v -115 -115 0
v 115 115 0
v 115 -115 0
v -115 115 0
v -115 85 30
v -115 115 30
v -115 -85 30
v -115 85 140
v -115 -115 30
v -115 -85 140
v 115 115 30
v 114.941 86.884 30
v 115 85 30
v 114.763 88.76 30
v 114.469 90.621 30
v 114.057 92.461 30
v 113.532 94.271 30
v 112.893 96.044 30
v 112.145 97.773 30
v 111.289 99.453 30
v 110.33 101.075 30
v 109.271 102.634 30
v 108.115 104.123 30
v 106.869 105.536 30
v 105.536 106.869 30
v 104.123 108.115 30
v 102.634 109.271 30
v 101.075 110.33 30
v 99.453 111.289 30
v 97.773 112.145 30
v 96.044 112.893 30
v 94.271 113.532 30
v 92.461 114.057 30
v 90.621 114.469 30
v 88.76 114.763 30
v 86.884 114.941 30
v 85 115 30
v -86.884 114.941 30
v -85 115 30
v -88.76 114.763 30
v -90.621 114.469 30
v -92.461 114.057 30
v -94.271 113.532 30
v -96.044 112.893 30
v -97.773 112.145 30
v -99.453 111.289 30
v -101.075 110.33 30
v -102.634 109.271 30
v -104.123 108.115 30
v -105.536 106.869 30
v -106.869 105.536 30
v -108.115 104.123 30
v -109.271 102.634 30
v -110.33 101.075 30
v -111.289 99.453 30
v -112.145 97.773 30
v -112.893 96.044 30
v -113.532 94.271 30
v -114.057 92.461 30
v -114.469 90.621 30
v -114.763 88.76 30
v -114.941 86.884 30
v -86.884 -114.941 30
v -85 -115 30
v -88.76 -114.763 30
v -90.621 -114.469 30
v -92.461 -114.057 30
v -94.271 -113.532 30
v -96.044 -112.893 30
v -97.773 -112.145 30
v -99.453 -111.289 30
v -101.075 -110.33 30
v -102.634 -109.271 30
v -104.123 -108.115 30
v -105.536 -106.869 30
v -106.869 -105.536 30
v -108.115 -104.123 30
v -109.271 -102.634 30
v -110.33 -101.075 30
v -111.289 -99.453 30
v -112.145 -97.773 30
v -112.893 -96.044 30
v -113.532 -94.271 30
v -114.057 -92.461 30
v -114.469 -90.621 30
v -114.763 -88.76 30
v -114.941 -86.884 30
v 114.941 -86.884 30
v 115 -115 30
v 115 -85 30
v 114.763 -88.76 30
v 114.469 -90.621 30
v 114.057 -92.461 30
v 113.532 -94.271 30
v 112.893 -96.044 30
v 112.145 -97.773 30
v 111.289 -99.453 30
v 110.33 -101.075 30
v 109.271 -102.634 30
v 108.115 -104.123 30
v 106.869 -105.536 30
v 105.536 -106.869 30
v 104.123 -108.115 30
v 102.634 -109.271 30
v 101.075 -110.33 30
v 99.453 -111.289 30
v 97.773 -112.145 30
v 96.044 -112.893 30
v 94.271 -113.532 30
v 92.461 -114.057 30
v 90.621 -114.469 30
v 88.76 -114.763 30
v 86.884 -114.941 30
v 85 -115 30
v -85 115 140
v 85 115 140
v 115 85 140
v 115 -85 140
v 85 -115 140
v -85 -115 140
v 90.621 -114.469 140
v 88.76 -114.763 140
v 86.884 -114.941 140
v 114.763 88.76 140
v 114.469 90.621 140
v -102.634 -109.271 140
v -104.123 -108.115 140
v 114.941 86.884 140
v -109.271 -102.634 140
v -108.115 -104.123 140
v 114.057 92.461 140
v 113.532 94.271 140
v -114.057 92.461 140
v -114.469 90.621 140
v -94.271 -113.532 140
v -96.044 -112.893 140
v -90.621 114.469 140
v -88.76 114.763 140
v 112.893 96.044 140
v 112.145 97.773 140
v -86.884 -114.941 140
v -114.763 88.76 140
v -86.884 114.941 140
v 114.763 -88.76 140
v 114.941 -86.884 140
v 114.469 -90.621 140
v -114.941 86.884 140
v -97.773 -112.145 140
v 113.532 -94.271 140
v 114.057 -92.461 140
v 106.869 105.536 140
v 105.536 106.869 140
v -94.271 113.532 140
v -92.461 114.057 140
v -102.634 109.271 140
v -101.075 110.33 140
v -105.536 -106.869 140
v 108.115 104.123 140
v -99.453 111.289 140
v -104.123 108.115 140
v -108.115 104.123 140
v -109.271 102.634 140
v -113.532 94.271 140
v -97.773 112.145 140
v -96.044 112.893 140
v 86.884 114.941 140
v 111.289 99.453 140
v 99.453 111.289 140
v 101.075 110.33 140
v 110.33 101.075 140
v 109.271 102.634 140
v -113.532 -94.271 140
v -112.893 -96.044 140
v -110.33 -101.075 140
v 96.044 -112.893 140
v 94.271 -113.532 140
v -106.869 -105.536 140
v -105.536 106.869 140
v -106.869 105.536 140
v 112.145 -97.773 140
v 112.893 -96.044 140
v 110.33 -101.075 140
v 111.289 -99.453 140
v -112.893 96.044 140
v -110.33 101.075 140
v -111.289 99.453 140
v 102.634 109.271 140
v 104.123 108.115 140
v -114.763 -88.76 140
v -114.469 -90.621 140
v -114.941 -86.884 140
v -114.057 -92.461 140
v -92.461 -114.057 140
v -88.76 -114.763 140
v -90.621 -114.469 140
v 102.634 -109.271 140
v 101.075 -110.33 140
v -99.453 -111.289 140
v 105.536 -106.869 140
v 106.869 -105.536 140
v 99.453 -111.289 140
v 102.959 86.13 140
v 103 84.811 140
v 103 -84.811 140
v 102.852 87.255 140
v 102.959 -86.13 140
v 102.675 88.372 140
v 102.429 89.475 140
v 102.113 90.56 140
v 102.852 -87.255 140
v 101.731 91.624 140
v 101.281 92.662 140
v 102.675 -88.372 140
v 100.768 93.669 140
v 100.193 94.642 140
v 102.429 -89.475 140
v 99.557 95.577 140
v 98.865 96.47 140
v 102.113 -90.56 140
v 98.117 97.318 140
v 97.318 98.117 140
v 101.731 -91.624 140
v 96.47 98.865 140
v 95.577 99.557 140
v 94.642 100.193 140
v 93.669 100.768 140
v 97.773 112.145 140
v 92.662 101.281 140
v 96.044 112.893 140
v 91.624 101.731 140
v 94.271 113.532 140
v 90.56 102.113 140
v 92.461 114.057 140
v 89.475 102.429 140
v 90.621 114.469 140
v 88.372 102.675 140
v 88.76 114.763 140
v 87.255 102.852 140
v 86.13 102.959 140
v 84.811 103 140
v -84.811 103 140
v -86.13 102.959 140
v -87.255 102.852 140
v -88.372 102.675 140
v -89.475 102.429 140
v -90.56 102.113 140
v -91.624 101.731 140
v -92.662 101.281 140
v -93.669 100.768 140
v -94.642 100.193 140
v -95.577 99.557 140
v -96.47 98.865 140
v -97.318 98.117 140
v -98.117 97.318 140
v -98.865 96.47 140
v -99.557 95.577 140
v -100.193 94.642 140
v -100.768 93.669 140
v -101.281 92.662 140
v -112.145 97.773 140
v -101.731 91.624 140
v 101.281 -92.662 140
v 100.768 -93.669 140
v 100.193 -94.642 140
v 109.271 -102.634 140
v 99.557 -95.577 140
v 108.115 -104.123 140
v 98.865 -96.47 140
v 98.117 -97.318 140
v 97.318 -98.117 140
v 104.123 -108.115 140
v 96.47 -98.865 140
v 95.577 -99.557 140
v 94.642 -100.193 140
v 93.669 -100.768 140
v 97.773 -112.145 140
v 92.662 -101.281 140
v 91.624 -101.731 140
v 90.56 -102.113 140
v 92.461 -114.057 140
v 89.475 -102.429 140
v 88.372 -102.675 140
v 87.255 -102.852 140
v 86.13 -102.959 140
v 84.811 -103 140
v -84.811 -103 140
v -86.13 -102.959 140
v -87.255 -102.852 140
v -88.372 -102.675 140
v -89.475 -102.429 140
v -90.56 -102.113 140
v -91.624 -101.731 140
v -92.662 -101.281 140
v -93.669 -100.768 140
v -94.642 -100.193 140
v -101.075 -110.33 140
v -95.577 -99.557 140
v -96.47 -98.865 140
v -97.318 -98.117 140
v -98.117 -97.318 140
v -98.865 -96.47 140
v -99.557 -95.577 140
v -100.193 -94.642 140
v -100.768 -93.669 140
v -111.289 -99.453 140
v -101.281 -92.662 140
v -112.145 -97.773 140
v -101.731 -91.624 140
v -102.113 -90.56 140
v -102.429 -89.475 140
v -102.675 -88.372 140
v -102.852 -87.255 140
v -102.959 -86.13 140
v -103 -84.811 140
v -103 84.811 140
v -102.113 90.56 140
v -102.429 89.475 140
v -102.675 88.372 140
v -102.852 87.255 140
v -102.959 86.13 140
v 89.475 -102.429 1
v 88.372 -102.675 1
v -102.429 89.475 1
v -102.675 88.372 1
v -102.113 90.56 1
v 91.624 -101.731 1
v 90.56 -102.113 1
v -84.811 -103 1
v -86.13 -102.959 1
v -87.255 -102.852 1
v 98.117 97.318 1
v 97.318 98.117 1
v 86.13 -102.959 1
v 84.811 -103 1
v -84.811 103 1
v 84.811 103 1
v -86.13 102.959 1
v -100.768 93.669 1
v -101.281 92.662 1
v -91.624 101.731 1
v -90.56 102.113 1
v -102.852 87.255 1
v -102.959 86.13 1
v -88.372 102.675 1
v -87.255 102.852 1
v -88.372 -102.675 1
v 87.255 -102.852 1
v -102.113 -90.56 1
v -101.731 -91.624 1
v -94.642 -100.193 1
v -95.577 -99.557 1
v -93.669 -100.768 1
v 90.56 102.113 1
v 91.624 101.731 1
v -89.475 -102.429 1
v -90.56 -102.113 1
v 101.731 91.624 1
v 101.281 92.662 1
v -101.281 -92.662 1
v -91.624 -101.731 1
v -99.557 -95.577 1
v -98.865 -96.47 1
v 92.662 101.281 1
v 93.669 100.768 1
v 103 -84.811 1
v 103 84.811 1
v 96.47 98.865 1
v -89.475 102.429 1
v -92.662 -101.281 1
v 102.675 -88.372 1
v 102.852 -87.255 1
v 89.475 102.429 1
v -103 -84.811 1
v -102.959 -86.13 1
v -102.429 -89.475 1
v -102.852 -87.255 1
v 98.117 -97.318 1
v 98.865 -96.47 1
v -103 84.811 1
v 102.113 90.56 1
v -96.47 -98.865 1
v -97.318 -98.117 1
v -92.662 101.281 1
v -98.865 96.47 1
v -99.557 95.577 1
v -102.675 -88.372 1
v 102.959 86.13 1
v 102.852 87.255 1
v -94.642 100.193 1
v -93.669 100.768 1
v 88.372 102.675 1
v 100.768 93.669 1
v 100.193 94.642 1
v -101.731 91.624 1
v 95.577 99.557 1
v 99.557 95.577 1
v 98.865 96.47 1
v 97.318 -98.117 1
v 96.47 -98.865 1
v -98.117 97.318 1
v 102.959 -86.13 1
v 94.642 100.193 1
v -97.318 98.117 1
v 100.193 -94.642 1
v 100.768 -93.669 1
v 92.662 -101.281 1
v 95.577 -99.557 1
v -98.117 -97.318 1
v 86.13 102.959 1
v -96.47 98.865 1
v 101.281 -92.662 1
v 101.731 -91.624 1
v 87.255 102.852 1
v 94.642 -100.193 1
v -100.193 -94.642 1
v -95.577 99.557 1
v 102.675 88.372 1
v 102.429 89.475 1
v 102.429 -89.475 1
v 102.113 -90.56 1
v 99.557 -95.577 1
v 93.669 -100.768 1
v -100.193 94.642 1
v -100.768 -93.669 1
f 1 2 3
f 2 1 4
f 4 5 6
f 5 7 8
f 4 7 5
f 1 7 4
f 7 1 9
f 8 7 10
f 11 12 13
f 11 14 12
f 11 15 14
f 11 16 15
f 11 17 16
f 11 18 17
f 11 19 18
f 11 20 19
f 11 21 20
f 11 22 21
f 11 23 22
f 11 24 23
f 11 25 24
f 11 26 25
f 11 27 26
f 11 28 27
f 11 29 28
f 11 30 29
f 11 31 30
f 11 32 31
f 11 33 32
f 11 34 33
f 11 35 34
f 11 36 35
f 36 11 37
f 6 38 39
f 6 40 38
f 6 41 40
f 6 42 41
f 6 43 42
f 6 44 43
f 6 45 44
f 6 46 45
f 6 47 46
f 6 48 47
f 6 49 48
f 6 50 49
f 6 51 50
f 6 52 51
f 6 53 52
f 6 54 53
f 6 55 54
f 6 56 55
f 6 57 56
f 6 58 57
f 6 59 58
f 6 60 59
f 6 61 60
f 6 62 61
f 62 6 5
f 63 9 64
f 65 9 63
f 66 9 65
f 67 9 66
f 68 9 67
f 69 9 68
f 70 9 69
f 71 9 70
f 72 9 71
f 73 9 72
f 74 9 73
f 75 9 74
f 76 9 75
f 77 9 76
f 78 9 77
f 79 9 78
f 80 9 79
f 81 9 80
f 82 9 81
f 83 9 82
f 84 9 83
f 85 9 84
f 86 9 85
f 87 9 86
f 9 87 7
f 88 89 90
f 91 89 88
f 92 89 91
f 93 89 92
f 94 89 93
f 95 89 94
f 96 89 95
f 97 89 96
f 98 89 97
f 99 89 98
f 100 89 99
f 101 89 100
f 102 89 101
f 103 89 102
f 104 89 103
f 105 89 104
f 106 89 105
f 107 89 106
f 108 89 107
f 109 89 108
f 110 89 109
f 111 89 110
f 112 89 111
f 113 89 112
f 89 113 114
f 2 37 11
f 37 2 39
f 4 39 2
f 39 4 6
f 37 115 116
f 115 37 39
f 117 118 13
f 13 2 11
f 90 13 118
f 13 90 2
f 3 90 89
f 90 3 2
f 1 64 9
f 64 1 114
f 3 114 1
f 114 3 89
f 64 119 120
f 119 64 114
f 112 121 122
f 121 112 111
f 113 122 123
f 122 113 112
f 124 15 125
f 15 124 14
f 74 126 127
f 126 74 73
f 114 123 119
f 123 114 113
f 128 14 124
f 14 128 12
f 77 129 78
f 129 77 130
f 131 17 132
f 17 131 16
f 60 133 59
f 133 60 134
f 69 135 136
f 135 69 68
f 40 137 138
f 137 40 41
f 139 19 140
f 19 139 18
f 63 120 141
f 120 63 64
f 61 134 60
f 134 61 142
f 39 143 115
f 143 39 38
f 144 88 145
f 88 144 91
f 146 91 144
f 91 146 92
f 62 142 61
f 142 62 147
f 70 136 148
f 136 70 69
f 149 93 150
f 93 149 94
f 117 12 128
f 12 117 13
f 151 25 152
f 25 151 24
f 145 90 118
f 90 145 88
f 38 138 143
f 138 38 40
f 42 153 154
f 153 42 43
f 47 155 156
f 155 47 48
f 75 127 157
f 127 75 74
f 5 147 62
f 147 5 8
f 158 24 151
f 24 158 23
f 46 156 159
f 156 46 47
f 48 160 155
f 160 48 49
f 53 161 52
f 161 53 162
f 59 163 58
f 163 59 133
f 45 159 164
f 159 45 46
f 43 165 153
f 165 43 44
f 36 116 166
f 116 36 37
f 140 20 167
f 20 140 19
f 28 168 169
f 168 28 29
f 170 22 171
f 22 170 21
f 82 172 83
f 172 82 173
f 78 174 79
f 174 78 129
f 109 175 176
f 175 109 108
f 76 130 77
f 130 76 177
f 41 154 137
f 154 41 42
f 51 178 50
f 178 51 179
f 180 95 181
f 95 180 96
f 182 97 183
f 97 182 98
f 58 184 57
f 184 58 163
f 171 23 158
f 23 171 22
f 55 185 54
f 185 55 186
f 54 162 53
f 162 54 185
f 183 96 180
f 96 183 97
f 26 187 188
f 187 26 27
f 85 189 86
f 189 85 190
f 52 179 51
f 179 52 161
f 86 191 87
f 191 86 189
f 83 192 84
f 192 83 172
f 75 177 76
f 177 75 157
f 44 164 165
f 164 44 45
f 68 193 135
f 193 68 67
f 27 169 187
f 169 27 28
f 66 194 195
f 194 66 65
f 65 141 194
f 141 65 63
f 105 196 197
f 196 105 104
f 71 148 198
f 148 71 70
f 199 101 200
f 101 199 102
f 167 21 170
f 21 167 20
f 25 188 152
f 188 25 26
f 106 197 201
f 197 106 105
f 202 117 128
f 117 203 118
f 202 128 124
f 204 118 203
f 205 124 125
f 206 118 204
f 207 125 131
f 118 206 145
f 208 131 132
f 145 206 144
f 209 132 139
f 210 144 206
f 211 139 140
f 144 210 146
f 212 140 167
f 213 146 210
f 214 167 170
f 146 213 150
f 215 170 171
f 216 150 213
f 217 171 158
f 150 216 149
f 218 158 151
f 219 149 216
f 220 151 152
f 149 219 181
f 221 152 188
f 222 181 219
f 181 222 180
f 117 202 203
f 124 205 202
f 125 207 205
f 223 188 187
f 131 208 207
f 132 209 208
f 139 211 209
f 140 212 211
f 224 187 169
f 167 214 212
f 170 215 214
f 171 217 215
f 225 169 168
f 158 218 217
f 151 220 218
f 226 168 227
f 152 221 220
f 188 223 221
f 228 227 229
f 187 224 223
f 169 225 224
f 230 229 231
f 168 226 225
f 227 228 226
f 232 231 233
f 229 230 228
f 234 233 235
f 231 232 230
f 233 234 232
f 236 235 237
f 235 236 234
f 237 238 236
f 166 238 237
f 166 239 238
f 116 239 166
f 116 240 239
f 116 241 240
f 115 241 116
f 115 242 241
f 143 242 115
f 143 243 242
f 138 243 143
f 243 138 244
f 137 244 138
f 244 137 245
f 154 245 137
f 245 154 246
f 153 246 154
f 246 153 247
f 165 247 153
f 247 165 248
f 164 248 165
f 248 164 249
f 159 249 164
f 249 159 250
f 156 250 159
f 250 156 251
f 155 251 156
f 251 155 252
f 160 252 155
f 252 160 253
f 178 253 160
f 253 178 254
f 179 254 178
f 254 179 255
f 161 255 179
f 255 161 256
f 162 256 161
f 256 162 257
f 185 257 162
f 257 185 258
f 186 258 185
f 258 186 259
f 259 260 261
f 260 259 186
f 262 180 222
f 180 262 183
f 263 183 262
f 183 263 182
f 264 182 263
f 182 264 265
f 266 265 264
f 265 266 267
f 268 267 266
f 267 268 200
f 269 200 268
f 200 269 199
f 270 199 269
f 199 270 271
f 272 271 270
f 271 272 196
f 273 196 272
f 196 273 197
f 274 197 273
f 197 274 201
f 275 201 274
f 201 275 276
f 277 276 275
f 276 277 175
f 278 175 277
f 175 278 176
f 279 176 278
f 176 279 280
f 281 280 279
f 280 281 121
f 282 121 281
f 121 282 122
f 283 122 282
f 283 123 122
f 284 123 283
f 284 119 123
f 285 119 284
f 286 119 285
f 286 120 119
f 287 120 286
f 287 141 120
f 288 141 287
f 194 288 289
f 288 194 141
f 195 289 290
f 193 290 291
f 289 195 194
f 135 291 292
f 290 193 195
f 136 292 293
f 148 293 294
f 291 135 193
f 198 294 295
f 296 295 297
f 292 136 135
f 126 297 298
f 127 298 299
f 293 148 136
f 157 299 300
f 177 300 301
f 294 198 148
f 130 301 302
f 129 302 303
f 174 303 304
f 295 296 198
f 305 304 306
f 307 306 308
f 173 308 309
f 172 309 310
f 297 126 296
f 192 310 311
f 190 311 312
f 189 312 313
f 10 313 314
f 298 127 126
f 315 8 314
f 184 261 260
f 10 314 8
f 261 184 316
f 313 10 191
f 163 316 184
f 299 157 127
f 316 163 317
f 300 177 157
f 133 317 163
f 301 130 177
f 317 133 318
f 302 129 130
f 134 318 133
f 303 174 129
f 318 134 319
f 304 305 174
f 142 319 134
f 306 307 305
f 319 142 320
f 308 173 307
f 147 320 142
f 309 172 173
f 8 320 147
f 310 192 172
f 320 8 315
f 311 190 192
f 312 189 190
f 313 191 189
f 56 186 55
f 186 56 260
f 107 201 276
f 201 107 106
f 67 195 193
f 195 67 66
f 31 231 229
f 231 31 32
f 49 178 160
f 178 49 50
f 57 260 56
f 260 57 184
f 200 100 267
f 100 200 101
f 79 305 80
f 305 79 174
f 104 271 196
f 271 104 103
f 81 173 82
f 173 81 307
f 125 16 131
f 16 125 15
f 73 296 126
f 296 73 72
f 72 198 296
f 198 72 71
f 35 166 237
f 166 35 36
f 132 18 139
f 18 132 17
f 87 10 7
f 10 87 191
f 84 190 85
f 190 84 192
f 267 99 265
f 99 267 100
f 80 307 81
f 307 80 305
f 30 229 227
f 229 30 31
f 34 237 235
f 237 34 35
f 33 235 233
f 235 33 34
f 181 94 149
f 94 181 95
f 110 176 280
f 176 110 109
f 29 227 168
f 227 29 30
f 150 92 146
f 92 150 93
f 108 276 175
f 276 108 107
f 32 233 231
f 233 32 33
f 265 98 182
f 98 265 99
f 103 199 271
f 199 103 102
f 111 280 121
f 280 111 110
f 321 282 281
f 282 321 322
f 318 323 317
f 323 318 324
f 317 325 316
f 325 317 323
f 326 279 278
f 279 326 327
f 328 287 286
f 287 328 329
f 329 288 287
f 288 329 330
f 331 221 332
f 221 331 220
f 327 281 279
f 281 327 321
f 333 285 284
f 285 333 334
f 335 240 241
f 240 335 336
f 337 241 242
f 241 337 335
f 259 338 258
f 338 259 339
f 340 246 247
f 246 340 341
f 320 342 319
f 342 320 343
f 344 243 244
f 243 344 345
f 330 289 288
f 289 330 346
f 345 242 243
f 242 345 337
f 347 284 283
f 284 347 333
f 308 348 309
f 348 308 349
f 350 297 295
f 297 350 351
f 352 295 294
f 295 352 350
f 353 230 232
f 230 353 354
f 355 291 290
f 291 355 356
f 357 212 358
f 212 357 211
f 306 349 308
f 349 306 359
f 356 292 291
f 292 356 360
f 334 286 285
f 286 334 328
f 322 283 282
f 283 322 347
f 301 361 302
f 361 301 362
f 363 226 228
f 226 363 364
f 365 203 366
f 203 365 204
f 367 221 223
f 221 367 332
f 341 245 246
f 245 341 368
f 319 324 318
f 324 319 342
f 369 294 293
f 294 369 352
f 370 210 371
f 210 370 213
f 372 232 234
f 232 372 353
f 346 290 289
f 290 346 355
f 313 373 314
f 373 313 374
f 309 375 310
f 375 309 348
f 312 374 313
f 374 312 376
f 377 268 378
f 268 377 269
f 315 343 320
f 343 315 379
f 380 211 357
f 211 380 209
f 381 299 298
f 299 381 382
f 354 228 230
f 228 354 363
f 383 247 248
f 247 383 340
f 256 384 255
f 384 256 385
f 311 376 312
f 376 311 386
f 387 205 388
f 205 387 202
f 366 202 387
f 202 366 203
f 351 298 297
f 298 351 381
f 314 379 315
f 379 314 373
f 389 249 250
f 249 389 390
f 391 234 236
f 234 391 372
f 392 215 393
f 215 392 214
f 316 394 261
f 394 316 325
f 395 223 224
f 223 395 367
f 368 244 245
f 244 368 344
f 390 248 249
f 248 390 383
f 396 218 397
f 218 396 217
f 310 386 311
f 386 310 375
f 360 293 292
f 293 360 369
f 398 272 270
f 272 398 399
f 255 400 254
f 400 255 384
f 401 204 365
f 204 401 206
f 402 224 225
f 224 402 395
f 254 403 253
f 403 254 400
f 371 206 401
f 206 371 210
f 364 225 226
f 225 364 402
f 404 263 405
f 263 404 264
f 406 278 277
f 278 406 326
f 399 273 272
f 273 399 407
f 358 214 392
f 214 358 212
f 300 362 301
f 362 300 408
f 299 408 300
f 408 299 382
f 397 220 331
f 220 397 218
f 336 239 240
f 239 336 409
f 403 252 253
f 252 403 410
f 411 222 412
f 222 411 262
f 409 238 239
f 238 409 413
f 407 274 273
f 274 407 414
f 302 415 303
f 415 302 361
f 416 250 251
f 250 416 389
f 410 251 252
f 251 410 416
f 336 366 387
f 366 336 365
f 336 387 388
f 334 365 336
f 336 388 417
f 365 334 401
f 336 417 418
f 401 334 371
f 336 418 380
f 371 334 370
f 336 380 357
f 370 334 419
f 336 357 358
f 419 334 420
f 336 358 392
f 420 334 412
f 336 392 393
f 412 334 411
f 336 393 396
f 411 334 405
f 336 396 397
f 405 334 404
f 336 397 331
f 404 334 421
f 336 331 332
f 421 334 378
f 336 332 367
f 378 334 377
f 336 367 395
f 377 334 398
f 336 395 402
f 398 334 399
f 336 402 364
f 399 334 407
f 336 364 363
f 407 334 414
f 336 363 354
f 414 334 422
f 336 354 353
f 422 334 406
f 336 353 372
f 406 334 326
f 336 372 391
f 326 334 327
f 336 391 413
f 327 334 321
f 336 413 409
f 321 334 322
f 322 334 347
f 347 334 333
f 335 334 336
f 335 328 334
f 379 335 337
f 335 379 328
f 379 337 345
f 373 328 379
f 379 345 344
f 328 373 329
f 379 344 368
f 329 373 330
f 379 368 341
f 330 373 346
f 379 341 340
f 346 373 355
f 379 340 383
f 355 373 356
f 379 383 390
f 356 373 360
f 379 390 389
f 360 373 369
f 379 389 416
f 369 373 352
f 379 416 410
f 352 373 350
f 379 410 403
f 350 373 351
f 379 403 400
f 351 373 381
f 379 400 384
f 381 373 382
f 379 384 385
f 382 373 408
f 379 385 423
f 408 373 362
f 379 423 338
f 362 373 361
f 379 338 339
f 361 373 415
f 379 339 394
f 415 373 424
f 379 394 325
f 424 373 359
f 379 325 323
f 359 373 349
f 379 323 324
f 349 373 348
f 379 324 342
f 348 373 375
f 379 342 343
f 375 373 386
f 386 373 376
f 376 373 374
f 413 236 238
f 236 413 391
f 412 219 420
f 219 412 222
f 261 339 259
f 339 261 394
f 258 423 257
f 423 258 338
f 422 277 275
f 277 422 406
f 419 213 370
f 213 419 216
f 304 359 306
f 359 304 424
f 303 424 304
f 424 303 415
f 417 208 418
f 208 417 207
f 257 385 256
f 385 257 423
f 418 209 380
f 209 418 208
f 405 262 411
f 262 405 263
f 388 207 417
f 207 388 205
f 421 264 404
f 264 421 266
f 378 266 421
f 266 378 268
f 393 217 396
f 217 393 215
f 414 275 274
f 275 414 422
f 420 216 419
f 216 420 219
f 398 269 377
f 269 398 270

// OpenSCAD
// =============================================================================
// FDM Printable Box with Rounded Corners
// Designed for jorisdeguet/jorisdeguet.github.io
// =============================================================================
// This model is optimized for 3D printing on an FDM printer with a 26cm cubic
// build volume.
//
// ORIENTATION NOTE:
// - When INSTALLED, the box opening faces FRONT.
// - When MODELLED & PRINTED, the opening faces UPWARD (along the Z-axis).
//   This allows printing the box without any support material, as the bottom
//   of the box (back wall when installed) rests flat on the print bed.
//
// DIMENSION MAPPING:
// - Model X-axis = Installed Width (default: 230 mm / 23 cm)
// - Model Y-axis = Installed Height (default: 230 mm / 23 cm)
// - Model Z-axis = Installed Depth (default: 170 mm / 17 cm)
// =============================================================================

/* [Box Dimensions] */

// Width of the box opening (installed horizontal width, model X-axis)
width = 230; // [50:1:300]

// Height of the box opening (installed vertical height, model Y-axis)
height = 230; // [50:1:300]

// Depth of the box (installed front-to-back depth, model Z-axis)
depth = 140; // [50:1:300]

/* [Wall & Corners] */

// Wall thickness of the side walls (in mm)
wall_thickness = 12.0; // [1.0:0.1:30.0]

// Wall thickness of the back wall (the bottom on the print bed, in mm)
back_wall_thickness = 1.0; // [1.0:0.1:30.0]

// Corner radius of the opening and outer walls (in mm)
corner_radius = 30.0; // [0.0:0.5:50.0]

// Thickness of the square outer section at the back of the box (in mm, 50mm = 5cm)
square_thickness = 30.0; // [0.0:1.0:200.0]

/* [Printer Options] */

// Maximum print volume dimension of your FDM printer (default: 260mm / 26cm)
max_print_volume = 260; // [100:1:500]

// Smoothness of circles (higher = smoother, lower = faster render)
$fn = 100; // [12:4:200]

// =============================================================================
// Safety Capping & Calculations
// =============================================================================

// Cap the corner radius to half of the smallest dimension to prevent self-intersection
max_safe_radius = min(width, height) / 2;
effective_radius = min(corner_radius, max_safe_radius);

// =============================================================================
// Assertions & Warnings
// =============================================================================

// Ensure dimensions fit the printer's build volume
assert(width <= max_print_volume, str("Error: Box width (", width, "mm) exceeds printer max volume (", max_print_volume, "mm)!"));
assert(height <= max_print_volume, str("Error: Box height (", height, "mm) exceeds printer max volume (", max_print_volume, "mm)!"));
assert(depth <= max_print_volume, str("Error: Box depth (", depth, "mm) exceeds printer max volume (", max_print_volume, "mm)!"));

// Ensure thickness is valid
assert(wall_thickness > 0, "Error: Wall thickness must be greater than 0!");
assert(back_wall_thickness > 0, "Error: Back wall thickness must be greater than 0!");
assert(back_wall_thickness < depth, "Error: Back wall thickness cannot exceed the total box depth!");
assert(width > 2 * wall_thickness, "Error: Wall thickness is too large for the given width!");
assert(height > 2 * wall_thickness, "Error: Wall thickness is too large for the given height!");
assert(square_thickness >= 0, "Error: Square thickness must be 0 or positive!");
assert(square_thickness <= depth, "Error: Square thickness cannot exceed the total box depth!");

// Print confirmation to console
echo("=================================================");
echo(str("Printing Box Dimensions: ", width, "x", height, "x", depth, " mm"));
echo(str("Wall Thickness (Sides): ", wall_thickness, " mm"));
echo(str("Back Wall Thickness: ", back_wall_thickness, " mm"));
echo(str("Corner Radius: ", effective_radius, " mm"));
echo(str("Square Section Thickness: ", square_thickness, " mm"));
echo("=================================================");

// =============================================================================
// 2D Profile Helper Module
// =============================================================================
module rounded_rect_profile(w, h, r) {
    if (r > 0) {
        offset(r = r) {
            square([w - 2 * r, h - 2 * r], center = true);
        }
    } else {
        square([w, h], center = true);
    }
}

// =============================================================================
// Main Box Geometry
// =============================================================================
module printable_box() {
    difference() {
        // 1. Outer Box Solid
        union() {
            // Bottom square section (from Z = 0 to square_thickness)
            if (square_thickness > 0) {
                linear_extrude(height = min(square_thickness, depth)) {
                    rounded_rect_profile(width, height, 0); // r = 0 means sharp corners
                }
            }
            
            // Top rounded section (from Z = square_thickness to depth)
            if (depth > square_thickness) {
                translate([0, 0, square_thickness]) {
                    linear_extrude(height = depth - square_thickness) {
                        rounded_rect_profile(width, height, effective_radius);
                    }
                }
            }
        }
        
        // 2. Inner Hollow Cutout
        // Shift up by back_wall_thickness along Z to keep a solid back/bottom
        translate([0, 0, back_wall_thickness]) {
            linear_extrude(height = depth) {
                offset(delta = -wall_thickness) {
                    rounded_rect_profile(width, height, effective_radius);
                }
            }
        }
    }
}

// Render the box
printable_box();
